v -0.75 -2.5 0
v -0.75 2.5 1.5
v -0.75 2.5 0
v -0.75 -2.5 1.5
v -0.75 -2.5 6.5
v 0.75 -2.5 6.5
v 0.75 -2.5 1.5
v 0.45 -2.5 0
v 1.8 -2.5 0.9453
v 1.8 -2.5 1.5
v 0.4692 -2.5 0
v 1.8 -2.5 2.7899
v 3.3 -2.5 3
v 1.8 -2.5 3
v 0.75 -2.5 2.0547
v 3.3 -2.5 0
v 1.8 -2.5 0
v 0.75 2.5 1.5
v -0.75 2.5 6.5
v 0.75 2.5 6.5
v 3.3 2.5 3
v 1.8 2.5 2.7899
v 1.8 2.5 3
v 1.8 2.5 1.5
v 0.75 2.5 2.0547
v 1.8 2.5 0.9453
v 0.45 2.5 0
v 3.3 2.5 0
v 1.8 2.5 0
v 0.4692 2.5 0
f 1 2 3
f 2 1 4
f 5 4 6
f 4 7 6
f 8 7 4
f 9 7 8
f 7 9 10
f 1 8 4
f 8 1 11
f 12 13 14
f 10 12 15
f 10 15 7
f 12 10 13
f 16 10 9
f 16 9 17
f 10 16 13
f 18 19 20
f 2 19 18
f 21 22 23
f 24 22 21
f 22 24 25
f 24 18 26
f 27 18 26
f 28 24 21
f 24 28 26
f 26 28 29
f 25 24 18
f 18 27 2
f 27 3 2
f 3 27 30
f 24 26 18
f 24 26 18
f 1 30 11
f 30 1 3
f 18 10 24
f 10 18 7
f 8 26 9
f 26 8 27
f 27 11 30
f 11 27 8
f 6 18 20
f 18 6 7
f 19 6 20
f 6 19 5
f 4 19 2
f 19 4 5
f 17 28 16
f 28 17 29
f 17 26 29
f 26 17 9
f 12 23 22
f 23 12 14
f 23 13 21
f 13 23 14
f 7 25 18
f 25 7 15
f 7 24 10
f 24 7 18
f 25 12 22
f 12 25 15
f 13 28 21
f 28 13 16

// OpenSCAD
debug = ["Asm"];

default_gaps=[0.4,0.4,0.4];

module snap_fit_connector(snap_box = [5,5,5], edge_offset=2, surface_height=7,
                          foot_height=10, angle=45,
                          draw_foot=true, draw_surface=true, 
                          gaps=[undef, undef, undef], foot_length=undef) {

    foot_length = foot_length == undef ? edge_offset : foot_length;
    gaps = [for(i=[0:(len(default_gaps)-1)]) gaps[i] == undef ?
                                                 default_gaps[i] : gaps[i]];
    side1_low = snap_box[0]-edge_offset;
    side1_up = snap_box[0]-foot_length;
    snap_head_up = (side1_low-side1_up)*tan(angle);
    foot_height = foot_height;
    side2 = tan(angle)*side1_low;
    assert(side1_low >= 0);
    assert(side2 <= snap_box[1]);

    module snap_fit_head() {
        snap_box = [snap_box[0], snap_box[2], snap_box[1]];
        render()
            rotate([-90, 0, 180]) {
            difference() {
                cube(snap_box, center=true);
                translate([-snap_box[0]/2,snap_box[1]/2-side2,-snap_box[2]/2])
                    linear_extrude(snap_box[2])
                    polygon(points=[[0,0],
                                    [0,side2+0.001],
                                    [side1_low,side2]]);
            }
        }
    }
    module snap_fit_foot() {
        translate([0,0,snap_box[2]+foot_height/2]) {
            cube([foot_length, snap_box[1], foot_height], center=true);
            translate([(snap_box[0]-foot_length)/2,
                       0,
                       -(foot_height+snap_box[2])/2])
                snap_fit_head();
        }
    }

    hole_clap_l = side1_up;
    head_offset = (snap_box[0]+foot_length)/2+gaps[0];

    surface_size = [snap_box[0]+foot_length+hole_clap_l+gaps[0],
                    snap_box[1]+2*gaps[1],
                    surface_height];

    module snap_surface_solid() {
        translate([(surface_size[0]-foot_length)/2-hole_clap_l,
                   0,
                   surface_height/2])
            cube(surface_size, center=true);
    }

    foot_z_offset = surface_height-snap_box[2]-gaps[2]-snap_box[2]+snap_head_up;

    module snap_surface() {
        module snap_head_place() {
            translate([head_offset,
                       0,
                       snap_head_up+surface_height-snap_box[2]/2])
                rotate([0,180,0])
                snap_fit_head();
        }

        difference() {
            snap_surface_solid();
            for(i = [0, gaps[0], -hole_clap_l], j = [-gaps[0], gaps[0]])
                translate([i,j,0])
                    linear_extrude(surface_height)
                    projection()
                    snap_fit_foot();
            translate([0,0,-foot_z_offset])
                snap_head_place();
        }
        module snap_head_up_cutted() {
            difference() {
                for(j = [-gaps[1], gaps[1]])
                    translate([0,j,-foot_z_offset ])
                        snap_head_place();
                difference() {
                    for(j = [-gaps[1], gaps[1]])
                        translate([0,j,-foot_z_offset ])
                            snap_head_place();
                    snap_surface_solid();
                }
            }
        }
        snap_head_up_cutted();
    }

    if(draw_foot)
        snap_fit_foot();
    if(draw_surface)
        snap_surface();
    if(!draw_surface && !draw_foot)
        snap_surface_solid();
}


for(val = debug){
    front_foot_width = 1.5;
    snapfit_box = [1.7*front_foot_width,
                   5,
                   front_foot_width];
    snapfit_edge_offset = front_foot_width*0.8;
    //snapfit_gaps = [3*0.1, 3*0.1, 3*0.1];
    snapfit_gaps = [0,0,0];
    snapfit_angle=35;
    snapfit_foot_height = 5;

    if(val == "Asm")
        snap_fit_connector(snapfit_box, snapfit_edge_offset, 3,
                           snapfit_foot_height,snapfit_angle,
                           gaps=snapfit_gaps,
                           foot_length=front_foot_width);
    if(val == "Connector")
        snap_fit_connector(draw_surface=false);
    if(val == "Socket")
        snap_fit_connector(draw_foot=false);
}
